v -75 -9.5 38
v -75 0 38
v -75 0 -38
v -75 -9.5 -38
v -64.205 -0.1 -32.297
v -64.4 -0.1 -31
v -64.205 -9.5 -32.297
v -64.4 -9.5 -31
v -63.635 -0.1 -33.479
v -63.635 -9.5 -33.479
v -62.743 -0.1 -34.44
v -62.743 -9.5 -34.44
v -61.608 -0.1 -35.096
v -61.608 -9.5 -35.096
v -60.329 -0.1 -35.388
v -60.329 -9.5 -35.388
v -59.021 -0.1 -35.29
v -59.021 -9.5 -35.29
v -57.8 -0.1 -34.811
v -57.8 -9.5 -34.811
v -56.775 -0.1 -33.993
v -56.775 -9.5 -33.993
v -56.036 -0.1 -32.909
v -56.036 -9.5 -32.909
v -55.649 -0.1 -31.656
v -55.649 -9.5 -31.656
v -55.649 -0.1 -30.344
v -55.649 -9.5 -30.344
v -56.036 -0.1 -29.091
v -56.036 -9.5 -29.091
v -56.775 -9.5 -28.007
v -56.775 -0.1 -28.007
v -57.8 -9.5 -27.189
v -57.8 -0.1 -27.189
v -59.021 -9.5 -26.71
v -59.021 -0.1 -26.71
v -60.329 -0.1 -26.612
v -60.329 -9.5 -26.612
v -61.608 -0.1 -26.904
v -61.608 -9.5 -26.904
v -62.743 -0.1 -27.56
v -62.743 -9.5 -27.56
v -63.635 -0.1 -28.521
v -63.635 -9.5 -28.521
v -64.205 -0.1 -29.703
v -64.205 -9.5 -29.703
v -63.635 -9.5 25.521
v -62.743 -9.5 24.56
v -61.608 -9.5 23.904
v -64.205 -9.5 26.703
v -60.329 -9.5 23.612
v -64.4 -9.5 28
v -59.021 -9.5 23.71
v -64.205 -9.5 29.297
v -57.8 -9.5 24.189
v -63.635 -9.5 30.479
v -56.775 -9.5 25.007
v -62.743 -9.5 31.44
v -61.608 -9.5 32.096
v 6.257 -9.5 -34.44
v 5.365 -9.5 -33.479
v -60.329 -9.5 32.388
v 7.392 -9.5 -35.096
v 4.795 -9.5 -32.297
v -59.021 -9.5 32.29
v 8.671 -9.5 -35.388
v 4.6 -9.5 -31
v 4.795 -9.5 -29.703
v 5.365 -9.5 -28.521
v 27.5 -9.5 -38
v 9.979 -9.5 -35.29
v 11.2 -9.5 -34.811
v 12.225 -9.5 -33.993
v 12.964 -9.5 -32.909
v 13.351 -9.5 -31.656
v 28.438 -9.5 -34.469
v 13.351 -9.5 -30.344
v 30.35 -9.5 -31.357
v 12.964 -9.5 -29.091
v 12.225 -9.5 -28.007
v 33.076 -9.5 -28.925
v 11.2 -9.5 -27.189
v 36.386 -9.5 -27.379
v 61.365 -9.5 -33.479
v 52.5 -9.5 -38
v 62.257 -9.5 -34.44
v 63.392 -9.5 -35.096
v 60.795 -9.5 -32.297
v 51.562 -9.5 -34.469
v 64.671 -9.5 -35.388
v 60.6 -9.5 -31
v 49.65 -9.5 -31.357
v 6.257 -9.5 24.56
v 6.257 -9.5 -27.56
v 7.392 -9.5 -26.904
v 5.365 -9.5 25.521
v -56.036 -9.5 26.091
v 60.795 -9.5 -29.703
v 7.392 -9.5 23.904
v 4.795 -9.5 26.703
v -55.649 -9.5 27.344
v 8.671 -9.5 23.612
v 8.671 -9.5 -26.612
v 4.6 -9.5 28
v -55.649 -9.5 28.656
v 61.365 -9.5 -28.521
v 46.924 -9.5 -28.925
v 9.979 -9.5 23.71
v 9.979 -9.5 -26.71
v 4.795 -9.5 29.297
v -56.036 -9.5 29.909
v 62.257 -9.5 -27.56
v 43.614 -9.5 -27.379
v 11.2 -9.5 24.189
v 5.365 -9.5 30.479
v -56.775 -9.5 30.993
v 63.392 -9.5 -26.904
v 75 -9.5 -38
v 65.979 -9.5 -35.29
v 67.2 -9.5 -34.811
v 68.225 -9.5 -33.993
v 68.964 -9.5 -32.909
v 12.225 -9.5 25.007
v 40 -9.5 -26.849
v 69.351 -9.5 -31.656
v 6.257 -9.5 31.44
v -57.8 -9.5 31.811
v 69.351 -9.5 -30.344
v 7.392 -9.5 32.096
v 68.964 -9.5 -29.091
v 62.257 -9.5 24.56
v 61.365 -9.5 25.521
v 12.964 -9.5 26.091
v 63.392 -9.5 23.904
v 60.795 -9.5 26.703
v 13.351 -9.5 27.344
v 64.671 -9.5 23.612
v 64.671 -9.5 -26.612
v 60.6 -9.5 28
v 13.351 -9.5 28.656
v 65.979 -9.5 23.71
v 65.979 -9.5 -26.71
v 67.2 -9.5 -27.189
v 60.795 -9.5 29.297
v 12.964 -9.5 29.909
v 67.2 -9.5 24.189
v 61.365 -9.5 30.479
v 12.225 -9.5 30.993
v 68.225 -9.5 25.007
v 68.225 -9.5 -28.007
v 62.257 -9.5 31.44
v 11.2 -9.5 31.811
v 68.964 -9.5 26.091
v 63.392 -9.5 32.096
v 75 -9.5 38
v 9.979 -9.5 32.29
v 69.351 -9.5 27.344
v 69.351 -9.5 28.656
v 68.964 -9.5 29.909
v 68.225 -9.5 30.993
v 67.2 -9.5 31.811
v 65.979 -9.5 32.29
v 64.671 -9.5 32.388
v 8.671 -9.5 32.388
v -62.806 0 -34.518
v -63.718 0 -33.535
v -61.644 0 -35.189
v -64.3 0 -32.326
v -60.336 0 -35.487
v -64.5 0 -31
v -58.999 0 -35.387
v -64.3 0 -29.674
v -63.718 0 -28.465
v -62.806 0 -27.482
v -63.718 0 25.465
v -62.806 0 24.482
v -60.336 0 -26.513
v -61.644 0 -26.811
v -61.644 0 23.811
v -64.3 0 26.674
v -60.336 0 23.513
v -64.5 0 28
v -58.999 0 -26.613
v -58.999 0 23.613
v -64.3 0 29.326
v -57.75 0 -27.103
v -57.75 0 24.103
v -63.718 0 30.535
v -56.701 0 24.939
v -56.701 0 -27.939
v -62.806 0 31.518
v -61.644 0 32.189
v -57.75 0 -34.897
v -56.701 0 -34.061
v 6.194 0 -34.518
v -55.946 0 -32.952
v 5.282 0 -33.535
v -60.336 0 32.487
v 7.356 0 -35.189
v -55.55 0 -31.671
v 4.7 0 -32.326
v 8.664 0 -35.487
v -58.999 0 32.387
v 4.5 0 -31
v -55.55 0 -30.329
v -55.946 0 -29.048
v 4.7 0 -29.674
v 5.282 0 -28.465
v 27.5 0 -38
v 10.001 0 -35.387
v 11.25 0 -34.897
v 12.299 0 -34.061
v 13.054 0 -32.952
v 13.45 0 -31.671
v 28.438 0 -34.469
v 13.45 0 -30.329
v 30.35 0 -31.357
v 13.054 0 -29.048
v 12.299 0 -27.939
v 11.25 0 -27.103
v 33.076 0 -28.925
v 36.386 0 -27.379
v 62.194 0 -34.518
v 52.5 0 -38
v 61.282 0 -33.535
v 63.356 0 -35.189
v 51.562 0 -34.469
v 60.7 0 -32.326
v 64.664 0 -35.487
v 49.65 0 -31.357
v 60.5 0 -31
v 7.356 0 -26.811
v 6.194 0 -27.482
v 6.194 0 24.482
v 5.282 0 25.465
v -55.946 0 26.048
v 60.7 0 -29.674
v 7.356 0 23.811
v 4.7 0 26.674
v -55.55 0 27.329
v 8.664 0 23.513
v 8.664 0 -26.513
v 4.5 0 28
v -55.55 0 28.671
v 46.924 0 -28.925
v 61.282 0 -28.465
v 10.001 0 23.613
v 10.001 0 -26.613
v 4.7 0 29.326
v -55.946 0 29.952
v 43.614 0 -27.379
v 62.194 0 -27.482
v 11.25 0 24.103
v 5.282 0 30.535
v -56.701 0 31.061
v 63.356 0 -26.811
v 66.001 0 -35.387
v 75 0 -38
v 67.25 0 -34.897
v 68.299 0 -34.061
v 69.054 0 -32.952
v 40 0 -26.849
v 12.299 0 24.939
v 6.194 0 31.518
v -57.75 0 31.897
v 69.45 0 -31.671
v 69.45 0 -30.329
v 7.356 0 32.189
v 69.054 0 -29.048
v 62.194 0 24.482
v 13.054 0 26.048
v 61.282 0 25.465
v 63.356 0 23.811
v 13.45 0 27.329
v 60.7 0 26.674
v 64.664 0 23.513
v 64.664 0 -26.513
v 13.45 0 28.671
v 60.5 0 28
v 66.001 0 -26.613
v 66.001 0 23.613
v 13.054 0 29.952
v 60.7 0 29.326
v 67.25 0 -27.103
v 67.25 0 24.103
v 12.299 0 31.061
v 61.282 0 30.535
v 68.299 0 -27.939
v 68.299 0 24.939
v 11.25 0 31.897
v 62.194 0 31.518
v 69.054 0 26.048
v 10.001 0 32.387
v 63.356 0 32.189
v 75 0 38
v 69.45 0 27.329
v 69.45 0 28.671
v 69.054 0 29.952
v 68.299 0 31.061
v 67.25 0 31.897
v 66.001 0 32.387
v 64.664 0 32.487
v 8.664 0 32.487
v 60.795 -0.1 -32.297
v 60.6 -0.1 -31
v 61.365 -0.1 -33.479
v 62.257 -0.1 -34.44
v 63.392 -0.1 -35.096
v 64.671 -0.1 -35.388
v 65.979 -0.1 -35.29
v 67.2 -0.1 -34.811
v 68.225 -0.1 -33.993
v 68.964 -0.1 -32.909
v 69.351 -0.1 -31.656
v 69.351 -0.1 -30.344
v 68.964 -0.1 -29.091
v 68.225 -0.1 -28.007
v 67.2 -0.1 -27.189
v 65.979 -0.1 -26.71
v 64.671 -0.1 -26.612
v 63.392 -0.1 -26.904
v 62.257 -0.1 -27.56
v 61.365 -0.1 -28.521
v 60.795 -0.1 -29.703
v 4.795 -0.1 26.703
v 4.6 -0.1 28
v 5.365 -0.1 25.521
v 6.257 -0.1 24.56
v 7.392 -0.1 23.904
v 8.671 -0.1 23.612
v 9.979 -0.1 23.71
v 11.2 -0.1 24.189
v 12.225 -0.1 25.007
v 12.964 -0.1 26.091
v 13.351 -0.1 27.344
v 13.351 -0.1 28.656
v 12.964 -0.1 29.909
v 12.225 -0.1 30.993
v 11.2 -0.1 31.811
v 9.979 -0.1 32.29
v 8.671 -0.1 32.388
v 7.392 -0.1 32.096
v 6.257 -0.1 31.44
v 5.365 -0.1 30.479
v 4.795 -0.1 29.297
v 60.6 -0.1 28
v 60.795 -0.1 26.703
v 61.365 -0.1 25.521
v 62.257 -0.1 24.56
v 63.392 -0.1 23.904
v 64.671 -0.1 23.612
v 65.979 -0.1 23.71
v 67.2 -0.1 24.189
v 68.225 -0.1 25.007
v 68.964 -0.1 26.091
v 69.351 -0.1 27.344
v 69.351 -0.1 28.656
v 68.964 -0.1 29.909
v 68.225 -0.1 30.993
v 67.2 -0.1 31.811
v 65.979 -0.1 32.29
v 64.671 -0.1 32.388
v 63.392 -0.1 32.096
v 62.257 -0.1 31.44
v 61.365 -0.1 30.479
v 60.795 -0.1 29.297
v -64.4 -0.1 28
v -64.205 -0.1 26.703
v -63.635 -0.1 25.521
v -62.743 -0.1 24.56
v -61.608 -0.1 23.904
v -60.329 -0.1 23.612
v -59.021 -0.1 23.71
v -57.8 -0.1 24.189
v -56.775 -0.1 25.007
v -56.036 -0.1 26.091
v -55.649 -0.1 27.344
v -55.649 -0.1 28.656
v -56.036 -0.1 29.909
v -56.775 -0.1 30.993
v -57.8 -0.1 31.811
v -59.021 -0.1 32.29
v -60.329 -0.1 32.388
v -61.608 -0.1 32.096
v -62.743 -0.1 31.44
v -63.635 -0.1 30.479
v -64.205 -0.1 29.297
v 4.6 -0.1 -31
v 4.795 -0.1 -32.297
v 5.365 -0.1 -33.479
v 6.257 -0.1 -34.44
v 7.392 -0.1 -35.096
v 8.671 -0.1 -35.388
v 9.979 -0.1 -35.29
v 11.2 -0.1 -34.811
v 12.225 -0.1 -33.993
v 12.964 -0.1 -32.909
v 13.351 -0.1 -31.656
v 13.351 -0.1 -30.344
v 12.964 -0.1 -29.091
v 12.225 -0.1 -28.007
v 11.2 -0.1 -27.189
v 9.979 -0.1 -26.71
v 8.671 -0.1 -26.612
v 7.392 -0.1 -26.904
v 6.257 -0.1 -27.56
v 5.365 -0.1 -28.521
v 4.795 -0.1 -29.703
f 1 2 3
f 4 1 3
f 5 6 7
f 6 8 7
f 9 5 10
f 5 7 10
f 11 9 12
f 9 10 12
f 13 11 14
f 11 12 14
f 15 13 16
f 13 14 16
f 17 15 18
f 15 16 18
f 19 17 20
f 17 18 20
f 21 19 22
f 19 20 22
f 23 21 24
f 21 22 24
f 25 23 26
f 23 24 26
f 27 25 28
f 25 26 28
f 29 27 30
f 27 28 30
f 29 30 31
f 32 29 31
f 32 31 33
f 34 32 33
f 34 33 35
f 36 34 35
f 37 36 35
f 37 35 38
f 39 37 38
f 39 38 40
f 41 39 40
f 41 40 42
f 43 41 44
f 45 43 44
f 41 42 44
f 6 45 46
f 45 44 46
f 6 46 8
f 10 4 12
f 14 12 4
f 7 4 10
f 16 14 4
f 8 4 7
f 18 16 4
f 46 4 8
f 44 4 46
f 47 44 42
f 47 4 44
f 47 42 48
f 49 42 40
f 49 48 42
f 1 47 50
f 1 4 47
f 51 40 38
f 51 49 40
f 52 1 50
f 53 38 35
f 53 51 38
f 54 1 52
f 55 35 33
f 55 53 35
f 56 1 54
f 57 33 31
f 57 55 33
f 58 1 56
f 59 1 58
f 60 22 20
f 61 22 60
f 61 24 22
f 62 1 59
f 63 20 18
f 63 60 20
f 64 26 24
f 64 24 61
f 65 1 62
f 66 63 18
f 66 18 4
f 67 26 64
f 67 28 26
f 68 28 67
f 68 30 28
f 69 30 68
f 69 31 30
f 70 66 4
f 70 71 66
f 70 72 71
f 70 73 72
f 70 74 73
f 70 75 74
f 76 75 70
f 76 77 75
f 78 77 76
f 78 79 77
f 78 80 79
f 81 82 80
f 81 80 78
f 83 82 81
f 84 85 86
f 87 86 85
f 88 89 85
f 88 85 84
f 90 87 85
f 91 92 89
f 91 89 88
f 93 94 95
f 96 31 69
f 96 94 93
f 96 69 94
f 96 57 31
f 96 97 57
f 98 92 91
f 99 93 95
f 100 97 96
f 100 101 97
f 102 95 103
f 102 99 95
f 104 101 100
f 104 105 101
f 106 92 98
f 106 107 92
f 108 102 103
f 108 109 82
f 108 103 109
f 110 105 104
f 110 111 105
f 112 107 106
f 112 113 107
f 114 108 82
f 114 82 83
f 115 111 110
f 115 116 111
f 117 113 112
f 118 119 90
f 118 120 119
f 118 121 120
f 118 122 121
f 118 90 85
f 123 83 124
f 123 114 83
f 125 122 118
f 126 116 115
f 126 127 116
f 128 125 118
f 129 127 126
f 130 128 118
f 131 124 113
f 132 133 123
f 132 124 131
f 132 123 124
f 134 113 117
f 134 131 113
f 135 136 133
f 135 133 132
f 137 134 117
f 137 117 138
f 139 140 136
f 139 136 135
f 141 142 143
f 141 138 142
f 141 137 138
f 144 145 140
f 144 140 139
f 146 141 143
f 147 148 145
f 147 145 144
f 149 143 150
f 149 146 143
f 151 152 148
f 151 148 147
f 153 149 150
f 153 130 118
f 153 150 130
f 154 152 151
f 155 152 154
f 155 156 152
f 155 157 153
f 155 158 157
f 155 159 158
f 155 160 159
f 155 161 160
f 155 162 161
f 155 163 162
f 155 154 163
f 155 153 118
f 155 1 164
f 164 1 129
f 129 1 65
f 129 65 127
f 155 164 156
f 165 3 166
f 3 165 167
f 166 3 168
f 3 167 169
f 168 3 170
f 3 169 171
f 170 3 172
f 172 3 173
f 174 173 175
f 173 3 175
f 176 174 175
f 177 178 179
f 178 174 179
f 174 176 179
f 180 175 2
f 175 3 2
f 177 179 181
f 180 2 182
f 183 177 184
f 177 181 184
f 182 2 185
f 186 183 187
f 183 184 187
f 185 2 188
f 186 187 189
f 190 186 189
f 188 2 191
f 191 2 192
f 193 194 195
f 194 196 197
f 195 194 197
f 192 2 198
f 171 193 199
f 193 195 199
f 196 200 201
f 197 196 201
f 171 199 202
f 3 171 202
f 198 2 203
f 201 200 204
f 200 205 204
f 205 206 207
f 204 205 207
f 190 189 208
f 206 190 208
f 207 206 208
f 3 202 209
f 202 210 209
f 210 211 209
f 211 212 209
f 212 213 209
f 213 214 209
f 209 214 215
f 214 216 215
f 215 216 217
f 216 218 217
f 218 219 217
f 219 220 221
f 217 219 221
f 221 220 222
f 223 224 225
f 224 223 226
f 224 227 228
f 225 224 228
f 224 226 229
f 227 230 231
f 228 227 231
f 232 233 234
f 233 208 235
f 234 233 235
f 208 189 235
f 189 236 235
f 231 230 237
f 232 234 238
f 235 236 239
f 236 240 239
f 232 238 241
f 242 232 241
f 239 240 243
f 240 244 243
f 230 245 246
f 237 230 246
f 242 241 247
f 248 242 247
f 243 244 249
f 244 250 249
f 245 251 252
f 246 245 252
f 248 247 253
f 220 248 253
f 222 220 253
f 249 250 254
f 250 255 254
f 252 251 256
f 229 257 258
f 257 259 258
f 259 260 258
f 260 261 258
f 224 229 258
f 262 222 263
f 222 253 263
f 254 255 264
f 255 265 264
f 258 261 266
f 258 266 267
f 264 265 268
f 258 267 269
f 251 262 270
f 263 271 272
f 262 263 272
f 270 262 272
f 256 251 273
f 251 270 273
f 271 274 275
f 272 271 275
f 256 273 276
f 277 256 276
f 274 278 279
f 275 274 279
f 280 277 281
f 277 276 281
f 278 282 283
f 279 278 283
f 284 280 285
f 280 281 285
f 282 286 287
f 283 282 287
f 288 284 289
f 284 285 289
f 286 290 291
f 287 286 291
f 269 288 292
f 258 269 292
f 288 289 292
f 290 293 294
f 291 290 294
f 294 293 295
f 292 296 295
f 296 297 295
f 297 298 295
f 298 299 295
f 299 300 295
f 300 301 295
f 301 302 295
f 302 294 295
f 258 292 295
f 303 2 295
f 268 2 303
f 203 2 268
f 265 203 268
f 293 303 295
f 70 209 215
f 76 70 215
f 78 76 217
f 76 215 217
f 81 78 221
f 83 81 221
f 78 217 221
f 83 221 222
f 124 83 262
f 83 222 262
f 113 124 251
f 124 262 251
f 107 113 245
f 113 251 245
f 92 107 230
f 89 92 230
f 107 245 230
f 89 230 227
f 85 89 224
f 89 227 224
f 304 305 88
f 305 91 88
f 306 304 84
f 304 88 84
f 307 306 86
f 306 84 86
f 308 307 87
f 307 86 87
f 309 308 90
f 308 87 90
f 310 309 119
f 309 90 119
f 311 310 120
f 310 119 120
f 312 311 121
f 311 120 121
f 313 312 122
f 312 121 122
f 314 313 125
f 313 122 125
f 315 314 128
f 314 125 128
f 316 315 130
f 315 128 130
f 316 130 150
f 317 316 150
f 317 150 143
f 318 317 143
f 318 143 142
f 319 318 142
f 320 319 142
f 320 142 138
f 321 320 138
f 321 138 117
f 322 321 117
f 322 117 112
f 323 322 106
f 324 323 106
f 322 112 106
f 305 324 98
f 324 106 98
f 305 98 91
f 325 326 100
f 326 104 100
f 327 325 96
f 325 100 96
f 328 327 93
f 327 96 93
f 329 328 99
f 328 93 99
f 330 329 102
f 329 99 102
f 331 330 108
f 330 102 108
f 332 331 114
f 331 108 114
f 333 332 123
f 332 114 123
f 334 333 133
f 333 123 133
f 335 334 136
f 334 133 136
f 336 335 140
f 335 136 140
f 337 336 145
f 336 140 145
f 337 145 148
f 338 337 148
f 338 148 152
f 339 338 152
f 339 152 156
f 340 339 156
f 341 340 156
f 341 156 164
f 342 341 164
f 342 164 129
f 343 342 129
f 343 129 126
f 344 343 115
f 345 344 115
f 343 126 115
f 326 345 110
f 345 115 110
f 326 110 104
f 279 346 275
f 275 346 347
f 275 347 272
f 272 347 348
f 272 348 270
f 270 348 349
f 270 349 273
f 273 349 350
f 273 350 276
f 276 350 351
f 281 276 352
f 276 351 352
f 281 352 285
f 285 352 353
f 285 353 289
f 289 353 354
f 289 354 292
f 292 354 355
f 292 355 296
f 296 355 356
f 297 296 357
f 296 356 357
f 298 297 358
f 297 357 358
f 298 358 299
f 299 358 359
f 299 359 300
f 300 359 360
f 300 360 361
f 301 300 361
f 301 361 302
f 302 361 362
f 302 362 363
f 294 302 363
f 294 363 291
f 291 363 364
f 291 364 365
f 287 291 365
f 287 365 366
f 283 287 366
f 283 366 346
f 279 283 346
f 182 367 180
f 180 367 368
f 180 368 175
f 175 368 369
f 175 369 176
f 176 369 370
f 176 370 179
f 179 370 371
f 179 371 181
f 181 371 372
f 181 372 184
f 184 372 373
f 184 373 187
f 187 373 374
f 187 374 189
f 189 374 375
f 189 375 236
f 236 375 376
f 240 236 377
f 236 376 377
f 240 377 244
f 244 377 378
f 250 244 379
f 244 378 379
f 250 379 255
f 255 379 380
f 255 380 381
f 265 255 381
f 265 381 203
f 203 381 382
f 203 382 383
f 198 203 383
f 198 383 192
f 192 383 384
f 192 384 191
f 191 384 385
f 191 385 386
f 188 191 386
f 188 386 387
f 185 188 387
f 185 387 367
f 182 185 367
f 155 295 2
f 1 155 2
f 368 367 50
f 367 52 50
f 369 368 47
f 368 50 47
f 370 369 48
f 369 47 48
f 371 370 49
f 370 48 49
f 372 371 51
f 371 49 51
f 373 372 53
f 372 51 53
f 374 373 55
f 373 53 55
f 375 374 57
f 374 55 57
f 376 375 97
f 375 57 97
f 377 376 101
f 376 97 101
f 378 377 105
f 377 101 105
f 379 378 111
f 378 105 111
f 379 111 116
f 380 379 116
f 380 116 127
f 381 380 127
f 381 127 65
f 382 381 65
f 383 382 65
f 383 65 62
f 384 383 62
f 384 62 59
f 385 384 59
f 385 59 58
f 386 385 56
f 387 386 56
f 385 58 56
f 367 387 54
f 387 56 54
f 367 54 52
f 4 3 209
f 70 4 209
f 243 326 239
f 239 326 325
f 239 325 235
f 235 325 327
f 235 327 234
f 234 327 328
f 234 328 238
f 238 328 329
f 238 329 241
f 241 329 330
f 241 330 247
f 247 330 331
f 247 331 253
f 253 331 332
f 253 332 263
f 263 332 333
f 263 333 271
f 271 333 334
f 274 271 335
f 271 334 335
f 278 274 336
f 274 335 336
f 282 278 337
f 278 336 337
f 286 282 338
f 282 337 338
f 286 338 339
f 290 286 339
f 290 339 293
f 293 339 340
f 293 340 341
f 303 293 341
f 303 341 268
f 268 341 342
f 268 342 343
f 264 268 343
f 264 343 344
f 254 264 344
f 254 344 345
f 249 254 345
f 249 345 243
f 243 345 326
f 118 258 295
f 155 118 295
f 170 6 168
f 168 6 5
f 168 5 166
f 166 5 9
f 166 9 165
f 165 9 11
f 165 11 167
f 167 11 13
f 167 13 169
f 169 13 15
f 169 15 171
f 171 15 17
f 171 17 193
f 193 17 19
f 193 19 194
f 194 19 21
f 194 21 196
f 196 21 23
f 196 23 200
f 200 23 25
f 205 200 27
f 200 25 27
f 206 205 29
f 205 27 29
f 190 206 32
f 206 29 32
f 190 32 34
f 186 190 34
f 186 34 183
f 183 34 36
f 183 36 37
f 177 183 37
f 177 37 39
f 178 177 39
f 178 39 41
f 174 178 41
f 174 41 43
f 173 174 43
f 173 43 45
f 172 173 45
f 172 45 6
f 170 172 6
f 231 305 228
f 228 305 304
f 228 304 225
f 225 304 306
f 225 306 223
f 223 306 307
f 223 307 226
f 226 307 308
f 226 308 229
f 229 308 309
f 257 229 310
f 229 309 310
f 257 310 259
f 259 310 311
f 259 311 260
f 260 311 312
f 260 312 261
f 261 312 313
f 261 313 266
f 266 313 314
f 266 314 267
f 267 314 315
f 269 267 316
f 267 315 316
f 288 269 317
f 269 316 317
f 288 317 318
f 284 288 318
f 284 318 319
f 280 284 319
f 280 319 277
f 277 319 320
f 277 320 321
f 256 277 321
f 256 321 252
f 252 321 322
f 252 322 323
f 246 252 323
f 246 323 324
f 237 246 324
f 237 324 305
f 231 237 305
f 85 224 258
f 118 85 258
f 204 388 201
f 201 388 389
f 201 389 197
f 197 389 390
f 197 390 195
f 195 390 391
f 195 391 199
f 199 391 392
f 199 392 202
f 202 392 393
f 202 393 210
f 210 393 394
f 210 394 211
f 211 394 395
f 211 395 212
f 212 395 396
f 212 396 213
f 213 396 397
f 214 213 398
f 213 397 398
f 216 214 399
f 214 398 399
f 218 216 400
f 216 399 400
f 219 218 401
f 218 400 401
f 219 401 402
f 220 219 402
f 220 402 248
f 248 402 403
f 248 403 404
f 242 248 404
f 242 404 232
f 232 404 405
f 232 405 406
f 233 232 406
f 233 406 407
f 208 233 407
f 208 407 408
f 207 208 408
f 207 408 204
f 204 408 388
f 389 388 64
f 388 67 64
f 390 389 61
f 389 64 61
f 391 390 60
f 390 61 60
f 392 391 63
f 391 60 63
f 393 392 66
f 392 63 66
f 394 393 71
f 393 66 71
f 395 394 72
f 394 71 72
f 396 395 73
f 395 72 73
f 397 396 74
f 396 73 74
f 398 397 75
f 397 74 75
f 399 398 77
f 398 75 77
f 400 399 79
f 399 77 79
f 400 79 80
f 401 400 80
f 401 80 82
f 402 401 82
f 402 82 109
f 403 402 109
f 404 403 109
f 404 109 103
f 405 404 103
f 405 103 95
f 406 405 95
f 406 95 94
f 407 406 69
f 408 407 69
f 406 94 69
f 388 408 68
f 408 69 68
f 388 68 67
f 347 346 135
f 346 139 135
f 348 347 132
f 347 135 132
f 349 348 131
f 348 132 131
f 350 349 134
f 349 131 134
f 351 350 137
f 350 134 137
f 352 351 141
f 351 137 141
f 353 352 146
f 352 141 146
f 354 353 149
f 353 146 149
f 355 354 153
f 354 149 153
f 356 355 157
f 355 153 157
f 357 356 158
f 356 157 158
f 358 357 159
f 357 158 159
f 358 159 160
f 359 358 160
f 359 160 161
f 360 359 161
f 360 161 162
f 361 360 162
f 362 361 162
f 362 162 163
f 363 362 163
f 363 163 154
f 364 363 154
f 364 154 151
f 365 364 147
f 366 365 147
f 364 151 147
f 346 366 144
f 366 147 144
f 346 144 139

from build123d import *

# Parameters (mm, degrees)
F1_DEPTH       = 9.5
F3_D           = 8.8
F3_CSINK_D     = 9
F3_CSINK_ANGLE = 90


with BuildPart() as f1:
    # F0 (on Front) → F1 (new body)
    with BuildSketch(Plane.XZ):
        with BuildLine():
            Line((52.5, -38), (75, -38))
            Line((75, -38), (75, 38))
            Line((75, 38), (-75, 38))
            Line((-75, 38), (-75, -38))
            Line((-75, -38), (27.5, -38))
            ThreePointArc((27.5, -38), (40, -26.8485699552), (52.5, -38))
        make_face()
    extrude(amount=F1_DEPTH)

    # F3 (through all)
    with Locations(Plane(origin=(0, 0, 0), x_dir=(1, 0, 0), z_dir=(0, 1, 0))):
        with Locations((-60, -28), (65, -28), (9, 31), (-60, 31), (65, 31), (9, -28)):
            CounterSinkHole(F3_D / 2, F3_CSINK_D / 2, counter_sink_angle=F3_CSINK_ANGLE)


solid = f1.part
